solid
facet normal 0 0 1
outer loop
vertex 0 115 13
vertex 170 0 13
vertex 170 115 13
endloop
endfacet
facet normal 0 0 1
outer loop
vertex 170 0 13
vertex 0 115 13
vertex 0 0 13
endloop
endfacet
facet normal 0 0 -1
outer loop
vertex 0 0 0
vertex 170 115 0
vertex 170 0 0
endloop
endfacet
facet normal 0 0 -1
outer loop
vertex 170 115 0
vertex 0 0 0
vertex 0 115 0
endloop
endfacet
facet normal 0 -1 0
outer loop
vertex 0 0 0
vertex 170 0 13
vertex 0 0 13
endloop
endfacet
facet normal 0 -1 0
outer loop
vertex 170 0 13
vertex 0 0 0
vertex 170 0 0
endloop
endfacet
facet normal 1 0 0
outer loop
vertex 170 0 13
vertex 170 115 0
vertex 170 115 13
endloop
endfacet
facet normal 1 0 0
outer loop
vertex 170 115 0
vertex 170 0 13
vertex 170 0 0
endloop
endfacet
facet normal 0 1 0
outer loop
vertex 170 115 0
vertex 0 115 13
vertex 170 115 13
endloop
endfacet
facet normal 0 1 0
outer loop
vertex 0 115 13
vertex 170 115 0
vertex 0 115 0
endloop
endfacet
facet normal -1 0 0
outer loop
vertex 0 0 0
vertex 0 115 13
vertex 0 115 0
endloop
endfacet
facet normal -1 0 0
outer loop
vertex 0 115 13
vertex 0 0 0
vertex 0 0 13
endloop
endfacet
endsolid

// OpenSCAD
// file: params.scad
// Case dimensions from build guide
// Overall envelope
case_w = 170;   // width  (mm) — display width + margins
case_h = 115;   // height (mm) — display height + margins
case_d = 26;    // depth  (mm) — uniform front-to-back

// Display cutout (front face)
display_w = 163; // display opening width  (mm)
display_h = 98;  // display opening height (mm)

// Cavity depths (back half)
battery_depth    = 6;   // battery cavity depth  (mm)
electronics_depth = 22; // electronics cavity depth (mm)

// Derived: wall thickness — raw expression gives -1mm with current dimensions
// (26 - 6 - 22) / 2 = -1; clamped to min_wall. Increase case_d for real geometry.
min_wall = 1;
wall = max(min_wall, (case_d - battery_depth - electronics_depth) / 2);
// main file
// Back piece — electronics + battery cavities, button holes on side edge
// TODO: implement cavity and button-hole geometry
include <params.scad>

module back() {
    // Stub: solid back slab
    cube([case_w, case_h, case_d / 2]);
}

back();
